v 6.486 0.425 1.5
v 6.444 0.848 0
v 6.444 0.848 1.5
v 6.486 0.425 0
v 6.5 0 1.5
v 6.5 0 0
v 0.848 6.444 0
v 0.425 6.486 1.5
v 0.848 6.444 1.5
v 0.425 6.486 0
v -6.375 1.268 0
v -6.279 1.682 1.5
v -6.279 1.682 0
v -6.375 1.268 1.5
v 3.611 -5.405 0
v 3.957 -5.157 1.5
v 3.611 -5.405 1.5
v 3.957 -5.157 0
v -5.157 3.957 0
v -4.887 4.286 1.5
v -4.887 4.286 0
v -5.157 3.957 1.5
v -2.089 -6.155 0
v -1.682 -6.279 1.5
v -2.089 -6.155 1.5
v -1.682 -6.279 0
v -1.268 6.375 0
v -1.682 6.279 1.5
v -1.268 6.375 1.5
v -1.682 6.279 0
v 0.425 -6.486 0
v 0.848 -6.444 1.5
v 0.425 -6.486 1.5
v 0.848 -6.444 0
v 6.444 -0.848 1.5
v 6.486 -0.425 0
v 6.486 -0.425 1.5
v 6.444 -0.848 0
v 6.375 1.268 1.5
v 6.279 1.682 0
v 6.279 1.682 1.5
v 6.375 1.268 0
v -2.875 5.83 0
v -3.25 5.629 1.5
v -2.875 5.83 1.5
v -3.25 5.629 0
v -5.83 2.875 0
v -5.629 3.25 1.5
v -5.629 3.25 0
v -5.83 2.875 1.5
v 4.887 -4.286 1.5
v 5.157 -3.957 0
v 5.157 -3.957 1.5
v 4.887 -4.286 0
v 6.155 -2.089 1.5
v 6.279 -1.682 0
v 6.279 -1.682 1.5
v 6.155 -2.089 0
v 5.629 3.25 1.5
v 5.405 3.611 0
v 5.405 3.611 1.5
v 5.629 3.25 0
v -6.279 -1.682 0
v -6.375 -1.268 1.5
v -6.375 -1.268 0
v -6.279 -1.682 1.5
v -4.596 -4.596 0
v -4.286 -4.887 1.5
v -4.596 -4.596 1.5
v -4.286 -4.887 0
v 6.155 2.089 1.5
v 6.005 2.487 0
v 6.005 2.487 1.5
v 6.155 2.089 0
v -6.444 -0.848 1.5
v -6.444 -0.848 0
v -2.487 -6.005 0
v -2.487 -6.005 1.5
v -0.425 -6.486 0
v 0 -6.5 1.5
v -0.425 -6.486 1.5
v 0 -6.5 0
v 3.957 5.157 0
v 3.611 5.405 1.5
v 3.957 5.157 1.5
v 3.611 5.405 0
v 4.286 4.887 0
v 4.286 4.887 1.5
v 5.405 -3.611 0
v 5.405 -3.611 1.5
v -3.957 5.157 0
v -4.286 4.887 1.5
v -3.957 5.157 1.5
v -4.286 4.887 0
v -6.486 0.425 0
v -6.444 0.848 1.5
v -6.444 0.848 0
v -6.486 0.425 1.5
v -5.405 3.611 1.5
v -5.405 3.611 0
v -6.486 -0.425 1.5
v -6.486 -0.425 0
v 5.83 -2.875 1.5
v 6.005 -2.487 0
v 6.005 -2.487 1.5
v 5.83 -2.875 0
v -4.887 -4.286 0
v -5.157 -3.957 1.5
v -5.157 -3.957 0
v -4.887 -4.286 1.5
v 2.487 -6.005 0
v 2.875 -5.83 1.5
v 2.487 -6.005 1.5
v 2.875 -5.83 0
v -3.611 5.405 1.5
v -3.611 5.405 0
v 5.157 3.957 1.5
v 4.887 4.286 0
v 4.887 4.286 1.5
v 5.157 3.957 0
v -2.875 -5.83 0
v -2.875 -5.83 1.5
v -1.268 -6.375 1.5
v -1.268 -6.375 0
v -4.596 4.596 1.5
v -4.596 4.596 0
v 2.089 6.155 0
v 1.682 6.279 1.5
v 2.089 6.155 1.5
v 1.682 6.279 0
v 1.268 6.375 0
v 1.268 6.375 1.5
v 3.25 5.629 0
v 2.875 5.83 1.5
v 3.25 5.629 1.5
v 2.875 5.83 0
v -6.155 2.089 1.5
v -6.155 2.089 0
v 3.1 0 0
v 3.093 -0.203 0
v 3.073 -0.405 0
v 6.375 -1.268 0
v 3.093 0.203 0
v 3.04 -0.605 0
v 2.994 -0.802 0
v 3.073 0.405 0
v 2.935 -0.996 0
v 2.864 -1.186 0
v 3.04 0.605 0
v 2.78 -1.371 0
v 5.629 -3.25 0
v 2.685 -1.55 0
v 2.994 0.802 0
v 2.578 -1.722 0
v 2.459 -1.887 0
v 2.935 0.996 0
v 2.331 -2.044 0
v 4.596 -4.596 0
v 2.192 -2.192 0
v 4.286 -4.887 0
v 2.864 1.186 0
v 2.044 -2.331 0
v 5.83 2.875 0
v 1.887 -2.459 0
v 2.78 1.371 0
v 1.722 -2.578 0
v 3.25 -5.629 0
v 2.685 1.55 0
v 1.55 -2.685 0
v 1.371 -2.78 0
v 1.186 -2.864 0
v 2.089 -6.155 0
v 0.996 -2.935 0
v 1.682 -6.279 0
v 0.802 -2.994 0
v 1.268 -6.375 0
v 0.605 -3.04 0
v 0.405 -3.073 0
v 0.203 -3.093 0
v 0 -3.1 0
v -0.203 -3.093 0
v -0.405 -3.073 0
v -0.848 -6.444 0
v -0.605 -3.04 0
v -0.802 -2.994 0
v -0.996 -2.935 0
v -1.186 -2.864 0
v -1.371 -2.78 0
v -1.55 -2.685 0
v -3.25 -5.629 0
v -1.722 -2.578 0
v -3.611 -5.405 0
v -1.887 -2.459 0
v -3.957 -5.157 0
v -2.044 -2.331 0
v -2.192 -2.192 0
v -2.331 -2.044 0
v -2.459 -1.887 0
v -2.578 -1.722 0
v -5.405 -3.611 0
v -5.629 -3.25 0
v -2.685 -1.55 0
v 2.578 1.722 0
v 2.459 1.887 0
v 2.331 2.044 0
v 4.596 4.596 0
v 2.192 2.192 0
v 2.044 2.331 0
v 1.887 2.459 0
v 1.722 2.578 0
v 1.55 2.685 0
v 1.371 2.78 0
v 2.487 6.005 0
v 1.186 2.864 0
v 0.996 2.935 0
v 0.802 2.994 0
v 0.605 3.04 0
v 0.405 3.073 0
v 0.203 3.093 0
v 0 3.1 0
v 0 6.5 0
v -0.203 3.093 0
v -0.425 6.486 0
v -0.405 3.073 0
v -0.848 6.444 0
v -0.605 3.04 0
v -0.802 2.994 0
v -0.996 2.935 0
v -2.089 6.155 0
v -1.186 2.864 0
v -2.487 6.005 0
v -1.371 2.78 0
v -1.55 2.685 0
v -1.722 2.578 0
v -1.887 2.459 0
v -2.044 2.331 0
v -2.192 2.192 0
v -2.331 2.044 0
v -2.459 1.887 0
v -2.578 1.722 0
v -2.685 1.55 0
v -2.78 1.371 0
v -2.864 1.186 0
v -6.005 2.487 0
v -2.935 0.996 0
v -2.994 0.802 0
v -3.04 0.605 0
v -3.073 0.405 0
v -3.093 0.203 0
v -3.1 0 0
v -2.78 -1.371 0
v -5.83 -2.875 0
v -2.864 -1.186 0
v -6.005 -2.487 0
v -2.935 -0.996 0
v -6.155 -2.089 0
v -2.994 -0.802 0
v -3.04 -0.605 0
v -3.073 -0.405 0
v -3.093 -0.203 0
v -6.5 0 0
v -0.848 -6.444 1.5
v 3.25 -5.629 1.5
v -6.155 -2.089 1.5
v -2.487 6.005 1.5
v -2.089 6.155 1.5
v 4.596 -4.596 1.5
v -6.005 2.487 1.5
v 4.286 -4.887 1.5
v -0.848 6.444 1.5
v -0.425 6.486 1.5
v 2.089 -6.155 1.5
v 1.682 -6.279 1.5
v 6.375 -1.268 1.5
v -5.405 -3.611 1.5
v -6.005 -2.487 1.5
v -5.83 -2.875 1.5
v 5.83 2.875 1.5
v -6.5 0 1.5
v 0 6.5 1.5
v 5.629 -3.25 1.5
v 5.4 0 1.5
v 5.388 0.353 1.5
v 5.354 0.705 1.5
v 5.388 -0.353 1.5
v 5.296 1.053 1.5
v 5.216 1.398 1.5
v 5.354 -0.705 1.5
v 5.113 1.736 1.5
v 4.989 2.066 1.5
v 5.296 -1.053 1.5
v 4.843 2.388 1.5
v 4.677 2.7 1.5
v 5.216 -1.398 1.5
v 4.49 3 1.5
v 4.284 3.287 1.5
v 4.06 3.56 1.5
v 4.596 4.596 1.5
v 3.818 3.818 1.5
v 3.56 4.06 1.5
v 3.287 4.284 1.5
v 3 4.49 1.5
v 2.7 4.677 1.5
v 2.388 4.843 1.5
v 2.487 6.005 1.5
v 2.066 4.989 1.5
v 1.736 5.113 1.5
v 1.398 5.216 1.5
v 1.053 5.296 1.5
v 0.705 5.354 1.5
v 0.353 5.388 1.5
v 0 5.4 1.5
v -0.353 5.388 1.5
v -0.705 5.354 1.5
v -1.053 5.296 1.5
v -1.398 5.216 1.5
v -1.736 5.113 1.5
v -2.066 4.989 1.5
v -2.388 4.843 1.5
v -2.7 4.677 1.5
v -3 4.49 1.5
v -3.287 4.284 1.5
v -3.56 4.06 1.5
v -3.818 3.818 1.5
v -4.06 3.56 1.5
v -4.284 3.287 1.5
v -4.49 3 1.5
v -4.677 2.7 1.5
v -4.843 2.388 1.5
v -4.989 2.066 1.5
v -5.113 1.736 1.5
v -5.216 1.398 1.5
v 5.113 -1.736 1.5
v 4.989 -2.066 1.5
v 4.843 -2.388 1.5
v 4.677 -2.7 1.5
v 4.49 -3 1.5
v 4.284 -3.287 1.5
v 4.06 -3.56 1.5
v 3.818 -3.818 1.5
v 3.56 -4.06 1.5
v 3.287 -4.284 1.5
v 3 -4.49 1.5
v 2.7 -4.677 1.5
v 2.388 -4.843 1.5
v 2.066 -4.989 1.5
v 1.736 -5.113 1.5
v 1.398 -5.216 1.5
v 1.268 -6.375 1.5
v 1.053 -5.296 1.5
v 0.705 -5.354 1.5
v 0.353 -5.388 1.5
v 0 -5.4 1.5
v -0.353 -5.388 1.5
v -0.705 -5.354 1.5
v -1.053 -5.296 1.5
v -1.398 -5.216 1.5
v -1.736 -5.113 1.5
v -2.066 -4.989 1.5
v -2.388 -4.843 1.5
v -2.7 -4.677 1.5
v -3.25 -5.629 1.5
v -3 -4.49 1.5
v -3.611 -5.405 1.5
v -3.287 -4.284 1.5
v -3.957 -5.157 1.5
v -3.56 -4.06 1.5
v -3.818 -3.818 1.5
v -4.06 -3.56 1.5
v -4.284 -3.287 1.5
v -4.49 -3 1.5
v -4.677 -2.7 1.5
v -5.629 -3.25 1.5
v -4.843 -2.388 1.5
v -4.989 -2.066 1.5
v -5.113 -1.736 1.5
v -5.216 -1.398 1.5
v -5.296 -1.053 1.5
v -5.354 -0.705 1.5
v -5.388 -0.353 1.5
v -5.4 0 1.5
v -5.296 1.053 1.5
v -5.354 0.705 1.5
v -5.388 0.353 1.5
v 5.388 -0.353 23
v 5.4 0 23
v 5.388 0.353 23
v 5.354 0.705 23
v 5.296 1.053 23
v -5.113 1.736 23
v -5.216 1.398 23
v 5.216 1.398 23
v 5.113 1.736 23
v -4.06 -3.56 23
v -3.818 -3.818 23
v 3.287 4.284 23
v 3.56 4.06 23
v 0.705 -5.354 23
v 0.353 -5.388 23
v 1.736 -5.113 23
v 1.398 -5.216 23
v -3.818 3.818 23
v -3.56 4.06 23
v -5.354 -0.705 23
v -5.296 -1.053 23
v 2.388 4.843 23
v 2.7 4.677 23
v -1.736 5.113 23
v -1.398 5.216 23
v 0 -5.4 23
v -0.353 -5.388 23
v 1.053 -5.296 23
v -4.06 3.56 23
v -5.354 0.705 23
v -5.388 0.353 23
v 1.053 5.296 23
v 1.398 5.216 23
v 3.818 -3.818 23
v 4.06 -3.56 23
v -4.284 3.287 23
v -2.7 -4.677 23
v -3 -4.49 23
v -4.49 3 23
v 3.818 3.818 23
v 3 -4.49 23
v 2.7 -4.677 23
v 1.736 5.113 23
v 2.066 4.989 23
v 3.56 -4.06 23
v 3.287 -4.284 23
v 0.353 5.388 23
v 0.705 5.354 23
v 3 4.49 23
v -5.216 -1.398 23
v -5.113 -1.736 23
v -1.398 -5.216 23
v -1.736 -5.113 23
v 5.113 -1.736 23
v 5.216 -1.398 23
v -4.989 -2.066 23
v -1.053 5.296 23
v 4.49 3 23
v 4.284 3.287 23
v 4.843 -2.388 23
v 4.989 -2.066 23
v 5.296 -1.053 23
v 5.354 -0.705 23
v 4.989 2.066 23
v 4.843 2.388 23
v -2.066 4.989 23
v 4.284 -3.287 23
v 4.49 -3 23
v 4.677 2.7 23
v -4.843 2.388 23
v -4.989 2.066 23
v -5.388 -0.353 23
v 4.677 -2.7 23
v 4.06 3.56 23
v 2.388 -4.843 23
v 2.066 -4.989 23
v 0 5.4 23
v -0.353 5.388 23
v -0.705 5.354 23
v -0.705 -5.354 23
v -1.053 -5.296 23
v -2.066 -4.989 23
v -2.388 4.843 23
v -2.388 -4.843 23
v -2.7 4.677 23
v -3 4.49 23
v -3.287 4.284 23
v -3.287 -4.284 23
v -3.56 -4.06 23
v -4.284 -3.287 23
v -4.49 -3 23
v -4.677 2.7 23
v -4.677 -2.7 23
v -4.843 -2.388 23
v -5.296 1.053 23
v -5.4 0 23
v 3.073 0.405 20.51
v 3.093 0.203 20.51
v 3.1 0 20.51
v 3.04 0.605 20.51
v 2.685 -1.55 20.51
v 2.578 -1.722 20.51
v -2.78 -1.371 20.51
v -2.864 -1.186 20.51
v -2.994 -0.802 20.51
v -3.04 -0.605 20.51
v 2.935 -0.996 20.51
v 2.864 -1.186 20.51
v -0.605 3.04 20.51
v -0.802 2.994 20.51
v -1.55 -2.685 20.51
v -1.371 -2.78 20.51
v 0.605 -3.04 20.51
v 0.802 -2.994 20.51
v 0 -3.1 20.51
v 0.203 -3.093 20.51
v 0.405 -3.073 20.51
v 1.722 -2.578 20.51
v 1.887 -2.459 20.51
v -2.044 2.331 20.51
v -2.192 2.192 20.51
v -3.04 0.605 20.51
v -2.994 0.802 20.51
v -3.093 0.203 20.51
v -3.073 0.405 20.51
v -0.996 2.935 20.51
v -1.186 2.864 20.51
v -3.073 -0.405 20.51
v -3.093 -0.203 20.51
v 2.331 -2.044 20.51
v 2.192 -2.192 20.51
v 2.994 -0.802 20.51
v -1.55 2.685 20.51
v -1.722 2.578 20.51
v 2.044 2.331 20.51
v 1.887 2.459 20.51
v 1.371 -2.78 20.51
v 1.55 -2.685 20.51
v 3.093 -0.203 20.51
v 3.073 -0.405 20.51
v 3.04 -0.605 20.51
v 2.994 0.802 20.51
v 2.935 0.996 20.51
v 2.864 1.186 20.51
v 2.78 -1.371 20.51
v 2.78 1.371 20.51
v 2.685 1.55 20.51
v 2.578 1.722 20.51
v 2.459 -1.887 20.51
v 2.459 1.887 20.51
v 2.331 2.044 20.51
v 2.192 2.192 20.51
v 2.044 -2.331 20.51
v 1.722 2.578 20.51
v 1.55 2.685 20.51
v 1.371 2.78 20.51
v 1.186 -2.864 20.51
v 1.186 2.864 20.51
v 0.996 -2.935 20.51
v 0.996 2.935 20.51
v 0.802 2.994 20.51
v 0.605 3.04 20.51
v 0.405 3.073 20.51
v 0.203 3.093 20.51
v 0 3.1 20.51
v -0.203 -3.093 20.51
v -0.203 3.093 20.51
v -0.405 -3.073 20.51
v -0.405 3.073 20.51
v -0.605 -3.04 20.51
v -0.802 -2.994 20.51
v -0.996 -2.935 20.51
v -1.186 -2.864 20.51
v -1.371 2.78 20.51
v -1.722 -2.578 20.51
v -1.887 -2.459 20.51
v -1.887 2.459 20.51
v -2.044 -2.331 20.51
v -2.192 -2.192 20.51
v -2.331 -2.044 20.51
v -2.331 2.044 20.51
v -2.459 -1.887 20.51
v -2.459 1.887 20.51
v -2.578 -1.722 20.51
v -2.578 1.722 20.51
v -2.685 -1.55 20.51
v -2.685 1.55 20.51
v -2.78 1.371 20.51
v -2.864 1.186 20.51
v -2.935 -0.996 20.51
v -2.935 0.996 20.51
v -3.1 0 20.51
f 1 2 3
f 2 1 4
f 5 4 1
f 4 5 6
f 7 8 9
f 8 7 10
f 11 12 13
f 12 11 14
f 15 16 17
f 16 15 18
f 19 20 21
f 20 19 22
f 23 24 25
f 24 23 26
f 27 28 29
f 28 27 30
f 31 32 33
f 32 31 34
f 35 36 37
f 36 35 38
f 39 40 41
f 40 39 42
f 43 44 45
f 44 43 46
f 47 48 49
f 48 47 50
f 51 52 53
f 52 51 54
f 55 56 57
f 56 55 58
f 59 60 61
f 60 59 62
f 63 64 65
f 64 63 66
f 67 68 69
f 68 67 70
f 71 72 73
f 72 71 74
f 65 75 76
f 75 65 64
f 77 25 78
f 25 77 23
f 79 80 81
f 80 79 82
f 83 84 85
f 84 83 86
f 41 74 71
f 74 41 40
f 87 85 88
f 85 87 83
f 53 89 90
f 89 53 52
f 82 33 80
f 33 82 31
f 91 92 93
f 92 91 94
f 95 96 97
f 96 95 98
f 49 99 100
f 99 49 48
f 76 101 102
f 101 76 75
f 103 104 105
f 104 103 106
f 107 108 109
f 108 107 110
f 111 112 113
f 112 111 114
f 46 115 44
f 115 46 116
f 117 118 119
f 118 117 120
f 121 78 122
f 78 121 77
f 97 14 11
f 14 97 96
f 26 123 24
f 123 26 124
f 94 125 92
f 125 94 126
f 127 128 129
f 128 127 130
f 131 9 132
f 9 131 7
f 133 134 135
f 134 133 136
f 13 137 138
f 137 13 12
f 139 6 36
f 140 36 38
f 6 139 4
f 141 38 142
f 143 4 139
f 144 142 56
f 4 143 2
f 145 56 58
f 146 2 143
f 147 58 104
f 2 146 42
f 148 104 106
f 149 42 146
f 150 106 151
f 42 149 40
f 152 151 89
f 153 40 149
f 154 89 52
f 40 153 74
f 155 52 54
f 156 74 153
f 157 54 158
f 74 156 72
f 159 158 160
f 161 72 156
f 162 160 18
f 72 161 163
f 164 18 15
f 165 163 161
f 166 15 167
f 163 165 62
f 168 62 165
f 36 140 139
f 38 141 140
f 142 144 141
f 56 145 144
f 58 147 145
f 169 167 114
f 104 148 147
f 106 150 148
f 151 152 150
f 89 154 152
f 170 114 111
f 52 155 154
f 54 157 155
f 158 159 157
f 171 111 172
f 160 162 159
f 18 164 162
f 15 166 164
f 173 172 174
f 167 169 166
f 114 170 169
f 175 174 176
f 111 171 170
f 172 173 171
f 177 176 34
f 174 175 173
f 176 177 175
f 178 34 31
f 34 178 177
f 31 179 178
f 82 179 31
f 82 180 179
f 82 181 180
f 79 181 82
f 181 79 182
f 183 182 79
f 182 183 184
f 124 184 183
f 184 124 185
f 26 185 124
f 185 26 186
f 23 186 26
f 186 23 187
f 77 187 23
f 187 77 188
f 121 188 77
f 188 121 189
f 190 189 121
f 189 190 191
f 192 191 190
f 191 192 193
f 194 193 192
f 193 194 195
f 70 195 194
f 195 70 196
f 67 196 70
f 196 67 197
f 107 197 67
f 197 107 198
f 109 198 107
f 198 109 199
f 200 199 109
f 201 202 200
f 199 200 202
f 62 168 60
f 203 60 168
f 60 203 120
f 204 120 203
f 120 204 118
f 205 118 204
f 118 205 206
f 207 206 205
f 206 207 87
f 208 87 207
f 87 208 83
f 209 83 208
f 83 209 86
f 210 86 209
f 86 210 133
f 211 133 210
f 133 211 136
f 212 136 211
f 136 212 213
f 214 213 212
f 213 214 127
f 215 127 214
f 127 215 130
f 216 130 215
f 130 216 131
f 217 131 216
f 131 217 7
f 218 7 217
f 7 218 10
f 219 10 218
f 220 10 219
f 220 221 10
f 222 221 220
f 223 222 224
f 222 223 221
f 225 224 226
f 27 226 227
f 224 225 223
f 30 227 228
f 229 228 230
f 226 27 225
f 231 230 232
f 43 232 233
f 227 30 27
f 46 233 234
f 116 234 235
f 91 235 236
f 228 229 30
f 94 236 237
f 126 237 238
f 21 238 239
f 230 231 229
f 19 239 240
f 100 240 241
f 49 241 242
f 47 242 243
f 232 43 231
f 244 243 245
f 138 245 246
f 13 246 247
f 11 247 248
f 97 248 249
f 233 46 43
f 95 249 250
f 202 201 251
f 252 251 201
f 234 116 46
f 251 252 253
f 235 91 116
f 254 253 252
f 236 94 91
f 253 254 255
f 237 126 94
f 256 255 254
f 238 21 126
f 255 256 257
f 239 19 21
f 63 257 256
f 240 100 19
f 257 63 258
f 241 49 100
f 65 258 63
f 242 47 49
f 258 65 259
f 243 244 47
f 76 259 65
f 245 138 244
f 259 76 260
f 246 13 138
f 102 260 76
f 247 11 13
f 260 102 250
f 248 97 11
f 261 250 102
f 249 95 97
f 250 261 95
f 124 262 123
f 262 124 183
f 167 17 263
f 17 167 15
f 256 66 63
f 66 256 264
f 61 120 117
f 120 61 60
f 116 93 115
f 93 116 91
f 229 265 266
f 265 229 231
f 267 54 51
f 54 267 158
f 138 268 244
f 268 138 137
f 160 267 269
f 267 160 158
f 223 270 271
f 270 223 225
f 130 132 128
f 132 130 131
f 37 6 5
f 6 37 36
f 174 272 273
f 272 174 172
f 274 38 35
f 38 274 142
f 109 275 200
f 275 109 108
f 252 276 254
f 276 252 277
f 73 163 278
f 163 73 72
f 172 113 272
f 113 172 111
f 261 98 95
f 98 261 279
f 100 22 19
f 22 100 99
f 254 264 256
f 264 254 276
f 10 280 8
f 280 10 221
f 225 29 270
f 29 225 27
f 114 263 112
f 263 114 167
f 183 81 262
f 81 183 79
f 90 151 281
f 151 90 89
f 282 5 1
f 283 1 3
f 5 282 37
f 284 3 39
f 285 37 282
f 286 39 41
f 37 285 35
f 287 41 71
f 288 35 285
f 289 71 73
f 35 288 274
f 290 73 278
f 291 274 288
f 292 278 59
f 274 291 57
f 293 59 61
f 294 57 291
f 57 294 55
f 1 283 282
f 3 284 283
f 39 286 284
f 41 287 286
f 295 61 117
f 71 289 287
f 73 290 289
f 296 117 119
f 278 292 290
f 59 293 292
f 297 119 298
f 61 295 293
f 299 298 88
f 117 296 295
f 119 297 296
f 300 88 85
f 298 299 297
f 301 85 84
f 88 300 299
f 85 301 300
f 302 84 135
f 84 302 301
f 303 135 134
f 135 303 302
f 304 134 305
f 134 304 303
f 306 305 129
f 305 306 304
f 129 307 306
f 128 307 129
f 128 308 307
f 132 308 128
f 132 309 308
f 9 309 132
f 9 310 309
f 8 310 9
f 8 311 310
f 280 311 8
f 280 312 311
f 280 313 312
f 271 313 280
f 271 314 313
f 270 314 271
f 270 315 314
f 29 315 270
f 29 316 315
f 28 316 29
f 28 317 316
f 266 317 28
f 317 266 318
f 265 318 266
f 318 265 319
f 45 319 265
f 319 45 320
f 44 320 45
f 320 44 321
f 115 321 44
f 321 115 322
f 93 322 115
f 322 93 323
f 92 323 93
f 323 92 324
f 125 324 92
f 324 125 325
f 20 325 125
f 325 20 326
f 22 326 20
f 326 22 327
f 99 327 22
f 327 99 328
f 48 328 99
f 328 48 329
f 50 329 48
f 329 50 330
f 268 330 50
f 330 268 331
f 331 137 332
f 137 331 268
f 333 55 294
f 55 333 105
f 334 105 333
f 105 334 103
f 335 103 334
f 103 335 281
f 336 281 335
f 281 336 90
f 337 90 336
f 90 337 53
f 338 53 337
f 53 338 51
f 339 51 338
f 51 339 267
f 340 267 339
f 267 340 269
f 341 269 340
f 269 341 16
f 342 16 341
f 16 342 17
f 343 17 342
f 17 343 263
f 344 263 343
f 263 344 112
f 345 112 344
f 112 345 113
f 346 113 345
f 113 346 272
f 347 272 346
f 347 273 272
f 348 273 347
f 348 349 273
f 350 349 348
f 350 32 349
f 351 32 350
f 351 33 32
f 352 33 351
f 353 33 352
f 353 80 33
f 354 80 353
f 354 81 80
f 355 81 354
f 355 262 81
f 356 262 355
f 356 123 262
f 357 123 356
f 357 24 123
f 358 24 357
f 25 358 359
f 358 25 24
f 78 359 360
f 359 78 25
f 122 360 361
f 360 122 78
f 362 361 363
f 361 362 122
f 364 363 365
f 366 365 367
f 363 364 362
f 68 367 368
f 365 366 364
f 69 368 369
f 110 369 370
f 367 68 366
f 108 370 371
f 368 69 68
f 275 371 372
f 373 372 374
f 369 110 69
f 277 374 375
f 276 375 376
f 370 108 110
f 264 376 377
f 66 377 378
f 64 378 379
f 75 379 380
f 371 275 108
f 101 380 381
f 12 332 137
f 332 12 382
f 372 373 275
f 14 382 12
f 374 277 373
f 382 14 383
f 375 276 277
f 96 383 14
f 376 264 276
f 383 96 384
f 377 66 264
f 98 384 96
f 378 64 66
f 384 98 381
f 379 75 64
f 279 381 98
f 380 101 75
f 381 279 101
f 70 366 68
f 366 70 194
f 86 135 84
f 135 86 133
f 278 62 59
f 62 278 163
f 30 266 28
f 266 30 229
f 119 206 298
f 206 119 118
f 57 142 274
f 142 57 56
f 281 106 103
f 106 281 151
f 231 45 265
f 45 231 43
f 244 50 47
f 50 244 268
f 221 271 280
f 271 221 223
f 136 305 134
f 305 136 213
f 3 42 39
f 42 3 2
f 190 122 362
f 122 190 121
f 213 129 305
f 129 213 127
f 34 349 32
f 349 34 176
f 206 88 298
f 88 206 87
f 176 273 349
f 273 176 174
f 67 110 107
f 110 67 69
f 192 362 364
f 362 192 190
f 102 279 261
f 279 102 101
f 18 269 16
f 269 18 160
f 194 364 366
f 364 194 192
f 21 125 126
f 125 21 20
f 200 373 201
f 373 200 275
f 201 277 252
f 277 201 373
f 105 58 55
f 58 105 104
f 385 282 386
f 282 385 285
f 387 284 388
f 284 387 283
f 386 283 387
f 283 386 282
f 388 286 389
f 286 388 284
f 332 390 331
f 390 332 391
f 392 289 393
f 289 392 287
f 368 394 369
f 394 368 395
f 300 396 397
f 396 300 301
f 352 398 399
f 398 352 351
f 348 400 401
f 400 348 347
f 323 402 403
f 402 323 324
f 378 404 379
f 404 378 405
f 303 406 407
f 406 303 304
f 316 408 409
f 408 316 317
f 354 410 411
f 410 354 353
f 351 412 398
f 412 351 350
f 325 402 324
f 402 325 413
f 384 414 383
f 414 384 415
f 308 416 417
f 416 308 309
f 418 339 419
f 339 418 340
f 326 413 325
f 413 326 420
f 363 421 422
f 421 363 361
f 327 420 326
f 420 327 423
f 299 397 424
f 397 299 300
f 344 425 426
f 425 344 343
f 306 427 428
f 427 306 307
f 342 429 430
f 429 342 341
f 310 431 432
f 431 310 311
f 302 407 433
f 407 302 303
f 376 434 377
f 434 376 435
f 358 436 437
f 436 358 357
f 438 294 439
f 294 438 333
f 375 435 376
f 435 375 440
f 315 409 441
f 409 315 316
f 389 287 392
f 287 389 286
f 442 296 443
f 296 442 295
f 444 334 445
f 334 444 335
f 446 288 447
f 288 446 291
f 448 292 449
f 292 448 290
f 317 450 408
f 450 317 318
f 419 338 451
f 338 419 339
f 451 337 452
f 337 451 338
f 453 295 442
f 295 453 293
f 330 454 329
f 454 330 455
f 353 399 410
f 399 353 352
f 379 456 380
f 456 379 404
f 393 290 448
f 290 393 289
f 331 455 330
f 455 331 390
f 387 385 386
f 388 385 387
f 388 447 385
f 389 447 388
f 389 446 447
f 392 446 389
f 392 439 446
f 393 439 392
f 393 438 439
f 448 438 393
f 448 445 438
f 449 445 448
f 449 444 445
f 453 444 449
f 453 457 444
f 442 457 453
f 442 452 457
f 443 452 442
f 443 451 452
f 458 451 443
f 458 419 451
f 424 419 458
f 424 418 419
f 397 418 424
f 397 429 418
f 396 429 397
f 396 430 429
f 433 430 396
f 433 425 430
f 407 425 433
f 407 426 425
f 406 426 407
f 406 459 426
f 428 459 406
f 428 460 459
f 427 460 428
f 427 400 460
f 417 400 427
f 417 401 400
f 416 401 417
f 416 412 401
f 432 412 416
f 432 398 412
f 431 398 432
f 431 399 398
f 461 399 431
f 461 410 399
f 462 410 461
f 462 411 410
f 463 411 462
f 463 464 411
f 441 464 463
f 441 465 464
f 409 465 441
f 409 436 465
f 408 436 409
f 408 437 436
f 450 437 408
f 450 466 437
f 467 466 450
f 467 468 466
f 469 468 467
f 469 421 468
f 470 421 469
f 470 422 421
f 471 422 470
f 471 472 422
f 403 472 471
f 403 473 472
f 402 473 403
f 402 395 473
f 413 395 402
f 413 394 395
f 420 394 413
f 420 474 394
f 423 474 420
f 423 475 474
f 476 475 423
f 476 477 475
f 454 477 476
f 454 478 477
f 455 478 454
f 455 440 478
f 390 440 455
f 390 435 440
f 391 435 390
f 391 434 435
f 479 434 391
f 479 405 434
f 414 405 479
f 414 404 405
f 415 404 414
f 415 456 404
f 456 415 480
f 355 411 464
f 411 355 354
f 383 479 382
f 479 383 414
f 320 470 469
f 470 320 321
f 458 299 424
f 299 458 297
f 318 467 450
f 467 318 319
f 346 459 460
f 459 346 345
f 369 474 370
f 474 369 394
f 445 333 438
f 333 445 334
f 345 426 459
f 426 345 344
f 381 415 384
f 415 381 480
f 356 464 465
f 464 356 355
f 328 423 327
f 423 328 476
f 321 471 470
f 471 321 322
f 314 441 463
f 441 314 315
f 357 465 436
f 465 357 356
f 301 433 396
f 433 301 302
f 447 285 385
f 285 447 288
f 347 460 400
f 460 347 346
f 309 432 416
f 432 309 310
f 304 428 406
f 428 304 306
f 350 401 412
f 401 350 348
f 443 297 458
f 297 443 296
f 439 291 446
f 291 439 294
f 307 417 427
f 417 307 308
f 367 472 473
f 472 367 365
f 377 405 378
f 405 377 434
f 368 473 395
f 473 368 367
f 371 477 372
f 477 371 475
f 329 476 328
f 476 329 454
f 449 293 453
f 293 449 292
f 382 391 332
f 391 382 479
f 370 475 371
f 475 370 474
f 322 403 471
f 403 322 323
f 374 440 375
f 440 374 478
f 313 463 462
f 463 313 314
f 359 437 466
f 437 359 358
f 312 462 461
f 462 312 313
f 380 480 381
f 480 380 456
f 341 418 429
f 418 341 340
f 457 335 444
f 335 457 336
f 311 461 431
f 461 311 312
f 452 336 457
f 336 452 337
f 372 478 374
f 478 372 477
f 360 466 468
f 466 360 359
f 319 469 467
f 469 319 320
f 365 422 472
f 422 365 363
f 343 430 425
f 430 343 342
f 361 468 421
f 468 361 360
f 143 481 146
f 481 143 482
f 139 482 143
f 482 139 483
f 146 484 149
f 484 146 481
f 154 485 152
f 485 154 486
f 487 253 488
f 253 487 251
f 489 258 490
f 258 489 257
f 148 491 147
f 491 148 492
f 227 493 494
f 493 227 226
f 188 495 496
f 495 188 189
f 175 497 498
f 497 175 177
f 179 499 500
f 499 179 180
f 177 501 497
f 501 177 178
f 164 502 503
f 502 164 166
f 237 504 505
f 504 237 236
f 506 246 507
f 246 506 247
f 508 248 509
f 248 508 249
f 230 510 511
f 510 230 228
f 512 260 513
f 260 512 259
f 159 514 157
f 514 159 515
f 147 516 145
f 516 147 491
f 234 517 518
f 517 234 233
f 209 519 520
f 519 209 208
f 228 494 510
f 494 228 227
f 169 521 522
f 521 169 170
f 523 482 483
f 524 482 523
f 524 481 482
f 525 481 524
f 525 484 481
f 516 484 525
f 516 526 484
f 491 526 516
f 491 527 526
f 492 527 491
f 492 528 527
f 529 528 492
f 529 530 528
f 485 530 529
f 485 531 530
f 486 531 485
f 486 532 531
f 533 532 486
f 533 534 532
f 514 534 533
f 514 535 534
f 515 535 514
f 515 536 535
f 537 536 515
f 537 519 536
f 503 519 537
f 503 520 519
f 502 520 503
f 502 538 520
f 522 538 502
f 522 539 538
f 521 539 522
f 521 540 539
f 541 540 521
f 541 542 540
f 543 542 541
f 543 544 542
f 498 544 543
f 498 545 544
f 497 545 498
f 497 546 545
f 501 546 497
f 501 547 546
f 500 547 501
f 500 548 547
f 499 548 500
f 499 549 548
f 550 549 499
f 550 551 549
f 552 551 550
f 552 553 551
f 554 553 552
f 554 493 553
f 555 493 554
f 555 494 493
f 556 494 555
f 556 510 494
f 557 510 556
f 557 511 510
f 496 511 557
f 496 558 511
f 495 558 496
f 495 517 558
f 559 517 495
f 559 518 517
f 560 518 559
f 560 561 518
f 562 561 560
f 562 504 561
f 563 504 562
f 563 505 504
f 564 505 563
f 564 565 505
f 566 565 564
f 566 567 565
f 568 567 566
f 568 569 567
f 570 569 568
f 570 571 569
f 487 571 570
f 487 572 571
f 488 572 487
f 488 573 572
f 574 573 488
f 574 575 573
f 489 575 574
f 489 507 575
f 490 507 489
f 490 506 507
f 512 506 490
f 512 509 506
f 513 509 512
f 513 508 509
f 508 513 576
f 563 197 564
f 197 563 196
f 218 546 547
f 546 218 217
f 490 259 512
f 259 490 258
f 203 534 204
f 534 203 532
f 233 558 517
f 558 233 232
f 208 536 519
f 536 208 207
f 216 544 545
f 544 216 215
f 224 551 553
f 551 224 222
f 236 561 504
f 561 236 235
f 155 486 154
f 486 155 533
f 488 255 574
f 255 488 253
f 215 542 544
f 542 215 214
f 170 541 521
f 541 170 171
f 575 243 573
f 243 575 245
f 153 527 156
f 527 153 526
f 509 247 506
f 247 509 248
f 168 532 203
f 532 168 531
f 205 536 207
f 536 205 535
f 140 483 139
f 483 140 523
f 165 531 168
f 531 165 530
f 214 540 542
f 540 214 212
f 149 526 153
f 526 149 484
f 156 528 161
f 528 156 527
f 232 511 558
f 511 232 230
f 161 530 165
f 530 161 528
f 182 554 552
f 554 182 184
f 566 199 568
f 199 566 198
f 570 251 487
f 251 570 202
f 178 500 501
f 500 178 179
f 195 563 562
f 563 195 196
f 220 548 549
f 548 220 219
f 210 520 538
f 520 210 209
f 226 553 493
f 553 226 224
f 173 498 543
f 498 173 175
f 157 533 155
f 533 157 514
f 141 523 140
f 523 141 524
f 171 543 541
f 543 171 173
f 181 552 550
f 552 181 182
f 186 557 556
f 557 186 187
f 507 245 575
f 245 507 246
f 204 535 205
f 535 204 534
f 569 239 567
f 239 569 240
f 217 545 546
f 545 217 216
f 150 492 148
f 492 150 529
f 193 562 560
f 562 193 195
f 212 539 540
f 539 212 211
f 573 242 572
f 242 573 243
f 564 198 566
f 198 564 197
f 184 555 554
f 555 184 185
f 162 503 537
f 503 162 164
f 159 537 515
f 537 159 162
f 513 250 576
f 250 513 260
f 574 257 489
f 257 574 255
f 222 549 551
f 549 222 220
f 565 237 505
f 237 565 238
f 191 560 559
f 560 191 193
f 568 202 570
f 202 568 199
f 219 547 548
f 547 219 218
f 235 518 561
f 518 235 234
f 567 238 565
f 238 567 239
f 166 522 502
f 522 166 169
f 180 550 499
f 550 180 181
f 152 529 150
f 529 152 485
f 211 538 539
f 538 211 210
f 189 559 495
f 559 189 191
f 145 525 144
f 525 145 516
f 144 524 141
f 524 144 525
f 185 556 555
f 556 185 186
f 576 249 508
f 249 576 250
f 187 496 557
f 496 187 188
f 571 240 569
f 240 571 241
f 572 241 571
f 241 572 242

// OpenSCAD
// PCR Tube Adapter Sleeve - fits a 0.2 mL tube into a 1.5 mL rack hole.
// Print orientation: Collar on bed (z=0 to 1.5), body rises to z=21.5.

// Dimensions
collar_od   = 13;      // Outer diameter of the collar
collar_t    = 1.5;     // Thickness of the collar
body_od     = 10.8;    // Outer diameter of the sleeve body
body_total  = 21.5;    // Total height of the part (from z=0 to top)
bore_d      = 6.2;     // Diameter of the straight bore

// Derived dimensions
collar_z_top = collar_t;

// Ensure smooth rendering for curved surfaces
$fn = 96;

difference() {
    union() {
        // 1. The Collar (lies on the bed)
        translate([0, 0, 0]) 
            cylinder(h = collar_t, d = collar_od);

        // 2. The Sleeve Body (rises from the collar to z=21.5)
        translate([0, 0, collar_z_top]) 
            cylinder(h = body_total, d = body_od);
    }
    
    // 3. The Bore (straight hole through the full height)
    // Cut height is body_total + 0.01 to ensure clean cut without extending bounding box
    translate([0, 0, -1]) 
        cylinder(h = body_total + 0.01, d = bore_d);
}
